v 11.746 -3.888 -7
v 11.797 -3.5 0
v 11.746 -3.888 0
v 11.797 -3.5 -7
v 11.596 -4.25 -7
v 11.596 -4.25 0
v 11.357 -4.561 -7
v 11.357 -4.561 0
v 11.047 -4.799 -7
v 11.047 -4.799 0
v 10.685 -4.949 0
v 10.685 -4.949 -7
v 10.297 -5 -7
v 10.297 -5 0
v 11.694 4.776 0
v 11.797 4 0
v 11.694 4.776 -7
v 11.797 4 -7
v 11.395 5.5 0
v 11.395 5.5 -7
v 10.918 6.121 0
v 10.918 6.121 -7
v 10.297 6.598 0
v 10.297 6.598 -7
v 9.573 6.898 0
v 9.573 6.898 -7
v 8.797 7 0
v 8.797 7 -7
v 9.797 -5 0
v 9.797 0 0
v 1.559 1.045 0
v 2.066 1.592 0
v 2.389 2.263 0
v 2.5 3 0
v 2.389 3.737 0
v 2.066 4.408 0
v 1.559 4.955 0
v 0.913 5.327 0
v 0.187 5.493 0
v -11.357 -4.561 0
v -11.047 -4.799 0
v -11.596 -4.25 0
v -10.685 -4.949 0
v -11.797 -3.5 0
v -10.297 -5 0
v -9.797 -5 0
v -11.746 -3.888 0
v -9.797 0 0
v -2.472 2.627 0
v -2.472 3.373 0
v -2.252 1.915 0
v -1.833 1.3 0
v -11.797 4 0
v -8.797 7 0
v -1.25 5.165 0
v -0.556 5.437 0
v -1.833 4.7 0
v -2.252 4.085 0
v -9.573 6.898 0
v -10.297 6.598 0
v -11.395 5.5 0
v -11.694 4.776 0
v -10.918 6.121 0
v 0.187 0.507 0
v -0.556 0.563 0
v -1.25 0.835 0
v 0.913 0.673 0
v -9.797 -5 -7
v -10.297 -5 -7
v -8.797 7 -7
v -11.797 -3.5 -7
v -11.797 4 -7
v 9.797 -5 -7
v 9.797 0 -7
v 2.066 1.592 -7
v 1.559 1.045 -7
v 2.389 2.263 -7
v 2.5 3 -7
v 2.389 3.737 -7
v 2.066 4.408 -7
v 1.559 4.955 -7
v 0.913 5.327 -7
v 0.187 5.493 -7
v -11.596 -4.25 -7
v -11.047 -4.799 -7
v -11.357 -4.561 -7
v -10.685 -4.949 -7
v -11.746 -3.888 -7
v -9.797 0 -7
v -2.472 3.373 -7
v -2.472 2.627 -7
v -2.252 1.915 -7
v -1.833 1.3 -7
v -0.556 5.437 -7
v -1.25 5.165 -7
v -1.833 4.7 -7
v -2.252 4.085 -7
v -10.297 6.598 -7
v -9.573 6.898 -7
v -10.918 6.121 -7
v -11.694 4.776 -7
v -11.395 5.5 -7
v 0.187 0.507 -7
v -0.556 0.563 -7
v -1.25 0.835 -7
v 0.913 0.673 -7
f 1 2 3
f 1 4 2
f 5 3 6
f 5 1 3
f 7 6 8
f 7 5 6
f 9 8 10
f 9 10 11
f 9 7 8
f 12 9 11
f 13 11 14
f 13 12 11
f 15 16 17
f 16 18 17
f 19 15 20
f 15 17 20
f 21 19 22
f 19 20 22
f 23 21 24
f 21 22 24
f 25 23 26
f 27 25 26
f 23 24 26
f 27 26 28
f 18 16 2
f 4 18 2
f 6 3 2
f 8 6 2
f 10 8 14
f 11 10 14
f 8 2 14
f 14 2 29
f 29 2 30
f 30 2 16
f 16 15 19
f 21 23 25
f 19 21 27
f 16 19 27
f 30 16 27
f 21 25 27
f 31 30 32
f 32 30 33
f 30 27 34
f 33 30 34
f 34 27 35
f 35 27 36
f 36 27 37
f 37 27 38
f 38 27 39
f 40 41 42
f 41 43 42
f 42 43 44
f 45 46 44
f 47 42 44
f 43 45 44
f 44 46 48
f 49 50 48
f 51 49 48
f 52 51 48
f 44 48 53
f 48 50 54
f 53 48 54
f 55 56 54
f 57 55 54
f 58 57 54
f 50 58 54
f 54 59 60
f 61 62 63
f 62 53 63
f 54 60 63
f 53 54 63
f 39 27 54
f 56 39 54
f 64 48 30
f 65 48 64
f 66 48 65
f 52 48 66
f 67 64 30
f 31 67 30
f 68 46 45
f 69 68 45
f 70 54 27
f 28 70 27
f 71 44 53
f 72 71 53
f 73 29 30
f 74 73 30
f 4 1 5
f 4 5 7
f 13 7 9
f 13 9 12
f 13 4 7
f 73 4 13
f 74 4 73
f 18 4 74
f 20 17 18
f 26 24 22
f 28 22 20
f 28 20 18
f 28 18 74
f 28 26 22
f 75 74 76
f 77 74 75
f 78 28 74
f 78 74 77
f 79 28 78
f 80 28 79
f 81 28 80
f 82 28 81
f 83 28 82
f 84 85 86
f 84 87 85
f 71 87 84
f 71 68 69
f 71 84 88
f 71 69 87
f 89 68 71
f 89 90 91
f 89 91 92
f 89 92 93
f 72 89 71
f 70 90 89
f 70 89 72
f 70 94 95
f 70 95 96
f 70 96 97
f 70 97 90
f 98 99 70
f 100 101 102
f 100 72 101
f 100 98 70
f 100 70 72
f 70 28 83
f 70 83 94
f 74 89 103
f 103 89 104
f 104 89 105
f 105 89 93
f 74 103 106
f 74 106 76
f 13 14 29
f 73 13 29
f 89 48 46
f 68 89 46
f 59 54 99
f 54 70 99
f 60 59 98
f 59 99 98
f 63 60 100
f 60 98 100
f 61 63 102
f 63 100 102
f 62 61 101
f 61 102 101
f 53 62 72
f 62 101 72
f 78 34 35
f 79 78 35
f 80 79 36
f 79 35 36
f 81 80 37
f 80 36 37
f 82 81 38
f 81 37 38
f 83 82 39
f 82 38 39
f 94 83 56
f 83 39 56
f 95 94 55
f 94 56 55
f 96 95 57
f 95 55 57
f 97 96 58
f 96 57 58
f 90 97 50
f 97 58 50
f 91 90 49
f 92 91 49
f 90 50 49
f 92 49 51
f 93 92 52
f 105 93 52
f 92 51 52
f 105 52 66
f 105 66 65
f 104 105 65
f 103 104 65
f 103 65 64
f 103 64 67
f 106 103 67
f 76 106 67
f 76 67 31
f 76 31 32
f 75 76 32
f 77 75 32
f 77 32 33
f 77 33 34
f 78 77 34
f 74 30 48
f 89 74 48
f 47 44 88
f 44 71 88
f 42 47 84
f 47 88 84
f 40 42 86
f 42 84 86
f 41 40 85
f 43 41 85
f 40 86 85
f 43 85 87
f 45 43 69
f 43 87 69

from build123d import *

# Parameters (mm, degrees)
BOSS_EXTRUDE1_DEPTH = 7
SKETCH5_R           = 2.5
CUT_EXTRUDE2_DEPTH  = 16.400080851
FILLET1_R           = 3
FILLET2_R           = 3
FILLET3_R           = 1.5
FILLET4_R           = 1.5


with BuildPart() as part:
    # Sketch1 → Boss-Extrude1 (new body)
    with BuildSketch(Plane.XY):
        Polygon((9.79671523, 0), (-9.79671523, 0), (-9.79671523, -5), (-11.79671523, -5), (-11.79671523, 7), (11.79671523, 7), (11.79671523, -5), (9.79671523, -5), align=None)
    extrude(amount=-BOSS_EXTRUDE1_DEPTH)

    # Sketch5 → Cut-Extrude2 (cut, through all)
    with BuildSketch(Plane.XY):
        with Locations((0, 3)):
            Circle(SKETCH5_R)
    extrude(amount=-CUT_EXTRUDE2_DEPTH, mode=Mode.SUBTRACT)

    # Fillet1
    fillet1_edges = [part.edges().sort_by_distance(p)[0] for p in [
        (11.79671523, 7, -3.5),
    ]]
    fillet(fillet1_edges, radius=FILLET1_R)

    # Fillet2
    fillet2_edges = [part.edges().sort_by_distance(p)[0] for p in [
        (-11.79671523, 7, -3.5),
    ]]
    fillet(fillet2_edges, radius=FILLET2_R)

    # Fillet3
    fillet3_edges = [part.edges().sort_by_distance(p)[0] for p in [
        (11.79671523, -5, -3.5),
    ]]
    fillet(fillet3_edges, radius=FILLET3_R)

    # Fillet4
    fillet4_edges = [part.edges().sort_by_distance(p)[0] for p in [
        (-11.79671523, -5, -3.5),
    ]]
    fillet(fillet4_edges, radius=FILLET4_R)


solid = part.part
